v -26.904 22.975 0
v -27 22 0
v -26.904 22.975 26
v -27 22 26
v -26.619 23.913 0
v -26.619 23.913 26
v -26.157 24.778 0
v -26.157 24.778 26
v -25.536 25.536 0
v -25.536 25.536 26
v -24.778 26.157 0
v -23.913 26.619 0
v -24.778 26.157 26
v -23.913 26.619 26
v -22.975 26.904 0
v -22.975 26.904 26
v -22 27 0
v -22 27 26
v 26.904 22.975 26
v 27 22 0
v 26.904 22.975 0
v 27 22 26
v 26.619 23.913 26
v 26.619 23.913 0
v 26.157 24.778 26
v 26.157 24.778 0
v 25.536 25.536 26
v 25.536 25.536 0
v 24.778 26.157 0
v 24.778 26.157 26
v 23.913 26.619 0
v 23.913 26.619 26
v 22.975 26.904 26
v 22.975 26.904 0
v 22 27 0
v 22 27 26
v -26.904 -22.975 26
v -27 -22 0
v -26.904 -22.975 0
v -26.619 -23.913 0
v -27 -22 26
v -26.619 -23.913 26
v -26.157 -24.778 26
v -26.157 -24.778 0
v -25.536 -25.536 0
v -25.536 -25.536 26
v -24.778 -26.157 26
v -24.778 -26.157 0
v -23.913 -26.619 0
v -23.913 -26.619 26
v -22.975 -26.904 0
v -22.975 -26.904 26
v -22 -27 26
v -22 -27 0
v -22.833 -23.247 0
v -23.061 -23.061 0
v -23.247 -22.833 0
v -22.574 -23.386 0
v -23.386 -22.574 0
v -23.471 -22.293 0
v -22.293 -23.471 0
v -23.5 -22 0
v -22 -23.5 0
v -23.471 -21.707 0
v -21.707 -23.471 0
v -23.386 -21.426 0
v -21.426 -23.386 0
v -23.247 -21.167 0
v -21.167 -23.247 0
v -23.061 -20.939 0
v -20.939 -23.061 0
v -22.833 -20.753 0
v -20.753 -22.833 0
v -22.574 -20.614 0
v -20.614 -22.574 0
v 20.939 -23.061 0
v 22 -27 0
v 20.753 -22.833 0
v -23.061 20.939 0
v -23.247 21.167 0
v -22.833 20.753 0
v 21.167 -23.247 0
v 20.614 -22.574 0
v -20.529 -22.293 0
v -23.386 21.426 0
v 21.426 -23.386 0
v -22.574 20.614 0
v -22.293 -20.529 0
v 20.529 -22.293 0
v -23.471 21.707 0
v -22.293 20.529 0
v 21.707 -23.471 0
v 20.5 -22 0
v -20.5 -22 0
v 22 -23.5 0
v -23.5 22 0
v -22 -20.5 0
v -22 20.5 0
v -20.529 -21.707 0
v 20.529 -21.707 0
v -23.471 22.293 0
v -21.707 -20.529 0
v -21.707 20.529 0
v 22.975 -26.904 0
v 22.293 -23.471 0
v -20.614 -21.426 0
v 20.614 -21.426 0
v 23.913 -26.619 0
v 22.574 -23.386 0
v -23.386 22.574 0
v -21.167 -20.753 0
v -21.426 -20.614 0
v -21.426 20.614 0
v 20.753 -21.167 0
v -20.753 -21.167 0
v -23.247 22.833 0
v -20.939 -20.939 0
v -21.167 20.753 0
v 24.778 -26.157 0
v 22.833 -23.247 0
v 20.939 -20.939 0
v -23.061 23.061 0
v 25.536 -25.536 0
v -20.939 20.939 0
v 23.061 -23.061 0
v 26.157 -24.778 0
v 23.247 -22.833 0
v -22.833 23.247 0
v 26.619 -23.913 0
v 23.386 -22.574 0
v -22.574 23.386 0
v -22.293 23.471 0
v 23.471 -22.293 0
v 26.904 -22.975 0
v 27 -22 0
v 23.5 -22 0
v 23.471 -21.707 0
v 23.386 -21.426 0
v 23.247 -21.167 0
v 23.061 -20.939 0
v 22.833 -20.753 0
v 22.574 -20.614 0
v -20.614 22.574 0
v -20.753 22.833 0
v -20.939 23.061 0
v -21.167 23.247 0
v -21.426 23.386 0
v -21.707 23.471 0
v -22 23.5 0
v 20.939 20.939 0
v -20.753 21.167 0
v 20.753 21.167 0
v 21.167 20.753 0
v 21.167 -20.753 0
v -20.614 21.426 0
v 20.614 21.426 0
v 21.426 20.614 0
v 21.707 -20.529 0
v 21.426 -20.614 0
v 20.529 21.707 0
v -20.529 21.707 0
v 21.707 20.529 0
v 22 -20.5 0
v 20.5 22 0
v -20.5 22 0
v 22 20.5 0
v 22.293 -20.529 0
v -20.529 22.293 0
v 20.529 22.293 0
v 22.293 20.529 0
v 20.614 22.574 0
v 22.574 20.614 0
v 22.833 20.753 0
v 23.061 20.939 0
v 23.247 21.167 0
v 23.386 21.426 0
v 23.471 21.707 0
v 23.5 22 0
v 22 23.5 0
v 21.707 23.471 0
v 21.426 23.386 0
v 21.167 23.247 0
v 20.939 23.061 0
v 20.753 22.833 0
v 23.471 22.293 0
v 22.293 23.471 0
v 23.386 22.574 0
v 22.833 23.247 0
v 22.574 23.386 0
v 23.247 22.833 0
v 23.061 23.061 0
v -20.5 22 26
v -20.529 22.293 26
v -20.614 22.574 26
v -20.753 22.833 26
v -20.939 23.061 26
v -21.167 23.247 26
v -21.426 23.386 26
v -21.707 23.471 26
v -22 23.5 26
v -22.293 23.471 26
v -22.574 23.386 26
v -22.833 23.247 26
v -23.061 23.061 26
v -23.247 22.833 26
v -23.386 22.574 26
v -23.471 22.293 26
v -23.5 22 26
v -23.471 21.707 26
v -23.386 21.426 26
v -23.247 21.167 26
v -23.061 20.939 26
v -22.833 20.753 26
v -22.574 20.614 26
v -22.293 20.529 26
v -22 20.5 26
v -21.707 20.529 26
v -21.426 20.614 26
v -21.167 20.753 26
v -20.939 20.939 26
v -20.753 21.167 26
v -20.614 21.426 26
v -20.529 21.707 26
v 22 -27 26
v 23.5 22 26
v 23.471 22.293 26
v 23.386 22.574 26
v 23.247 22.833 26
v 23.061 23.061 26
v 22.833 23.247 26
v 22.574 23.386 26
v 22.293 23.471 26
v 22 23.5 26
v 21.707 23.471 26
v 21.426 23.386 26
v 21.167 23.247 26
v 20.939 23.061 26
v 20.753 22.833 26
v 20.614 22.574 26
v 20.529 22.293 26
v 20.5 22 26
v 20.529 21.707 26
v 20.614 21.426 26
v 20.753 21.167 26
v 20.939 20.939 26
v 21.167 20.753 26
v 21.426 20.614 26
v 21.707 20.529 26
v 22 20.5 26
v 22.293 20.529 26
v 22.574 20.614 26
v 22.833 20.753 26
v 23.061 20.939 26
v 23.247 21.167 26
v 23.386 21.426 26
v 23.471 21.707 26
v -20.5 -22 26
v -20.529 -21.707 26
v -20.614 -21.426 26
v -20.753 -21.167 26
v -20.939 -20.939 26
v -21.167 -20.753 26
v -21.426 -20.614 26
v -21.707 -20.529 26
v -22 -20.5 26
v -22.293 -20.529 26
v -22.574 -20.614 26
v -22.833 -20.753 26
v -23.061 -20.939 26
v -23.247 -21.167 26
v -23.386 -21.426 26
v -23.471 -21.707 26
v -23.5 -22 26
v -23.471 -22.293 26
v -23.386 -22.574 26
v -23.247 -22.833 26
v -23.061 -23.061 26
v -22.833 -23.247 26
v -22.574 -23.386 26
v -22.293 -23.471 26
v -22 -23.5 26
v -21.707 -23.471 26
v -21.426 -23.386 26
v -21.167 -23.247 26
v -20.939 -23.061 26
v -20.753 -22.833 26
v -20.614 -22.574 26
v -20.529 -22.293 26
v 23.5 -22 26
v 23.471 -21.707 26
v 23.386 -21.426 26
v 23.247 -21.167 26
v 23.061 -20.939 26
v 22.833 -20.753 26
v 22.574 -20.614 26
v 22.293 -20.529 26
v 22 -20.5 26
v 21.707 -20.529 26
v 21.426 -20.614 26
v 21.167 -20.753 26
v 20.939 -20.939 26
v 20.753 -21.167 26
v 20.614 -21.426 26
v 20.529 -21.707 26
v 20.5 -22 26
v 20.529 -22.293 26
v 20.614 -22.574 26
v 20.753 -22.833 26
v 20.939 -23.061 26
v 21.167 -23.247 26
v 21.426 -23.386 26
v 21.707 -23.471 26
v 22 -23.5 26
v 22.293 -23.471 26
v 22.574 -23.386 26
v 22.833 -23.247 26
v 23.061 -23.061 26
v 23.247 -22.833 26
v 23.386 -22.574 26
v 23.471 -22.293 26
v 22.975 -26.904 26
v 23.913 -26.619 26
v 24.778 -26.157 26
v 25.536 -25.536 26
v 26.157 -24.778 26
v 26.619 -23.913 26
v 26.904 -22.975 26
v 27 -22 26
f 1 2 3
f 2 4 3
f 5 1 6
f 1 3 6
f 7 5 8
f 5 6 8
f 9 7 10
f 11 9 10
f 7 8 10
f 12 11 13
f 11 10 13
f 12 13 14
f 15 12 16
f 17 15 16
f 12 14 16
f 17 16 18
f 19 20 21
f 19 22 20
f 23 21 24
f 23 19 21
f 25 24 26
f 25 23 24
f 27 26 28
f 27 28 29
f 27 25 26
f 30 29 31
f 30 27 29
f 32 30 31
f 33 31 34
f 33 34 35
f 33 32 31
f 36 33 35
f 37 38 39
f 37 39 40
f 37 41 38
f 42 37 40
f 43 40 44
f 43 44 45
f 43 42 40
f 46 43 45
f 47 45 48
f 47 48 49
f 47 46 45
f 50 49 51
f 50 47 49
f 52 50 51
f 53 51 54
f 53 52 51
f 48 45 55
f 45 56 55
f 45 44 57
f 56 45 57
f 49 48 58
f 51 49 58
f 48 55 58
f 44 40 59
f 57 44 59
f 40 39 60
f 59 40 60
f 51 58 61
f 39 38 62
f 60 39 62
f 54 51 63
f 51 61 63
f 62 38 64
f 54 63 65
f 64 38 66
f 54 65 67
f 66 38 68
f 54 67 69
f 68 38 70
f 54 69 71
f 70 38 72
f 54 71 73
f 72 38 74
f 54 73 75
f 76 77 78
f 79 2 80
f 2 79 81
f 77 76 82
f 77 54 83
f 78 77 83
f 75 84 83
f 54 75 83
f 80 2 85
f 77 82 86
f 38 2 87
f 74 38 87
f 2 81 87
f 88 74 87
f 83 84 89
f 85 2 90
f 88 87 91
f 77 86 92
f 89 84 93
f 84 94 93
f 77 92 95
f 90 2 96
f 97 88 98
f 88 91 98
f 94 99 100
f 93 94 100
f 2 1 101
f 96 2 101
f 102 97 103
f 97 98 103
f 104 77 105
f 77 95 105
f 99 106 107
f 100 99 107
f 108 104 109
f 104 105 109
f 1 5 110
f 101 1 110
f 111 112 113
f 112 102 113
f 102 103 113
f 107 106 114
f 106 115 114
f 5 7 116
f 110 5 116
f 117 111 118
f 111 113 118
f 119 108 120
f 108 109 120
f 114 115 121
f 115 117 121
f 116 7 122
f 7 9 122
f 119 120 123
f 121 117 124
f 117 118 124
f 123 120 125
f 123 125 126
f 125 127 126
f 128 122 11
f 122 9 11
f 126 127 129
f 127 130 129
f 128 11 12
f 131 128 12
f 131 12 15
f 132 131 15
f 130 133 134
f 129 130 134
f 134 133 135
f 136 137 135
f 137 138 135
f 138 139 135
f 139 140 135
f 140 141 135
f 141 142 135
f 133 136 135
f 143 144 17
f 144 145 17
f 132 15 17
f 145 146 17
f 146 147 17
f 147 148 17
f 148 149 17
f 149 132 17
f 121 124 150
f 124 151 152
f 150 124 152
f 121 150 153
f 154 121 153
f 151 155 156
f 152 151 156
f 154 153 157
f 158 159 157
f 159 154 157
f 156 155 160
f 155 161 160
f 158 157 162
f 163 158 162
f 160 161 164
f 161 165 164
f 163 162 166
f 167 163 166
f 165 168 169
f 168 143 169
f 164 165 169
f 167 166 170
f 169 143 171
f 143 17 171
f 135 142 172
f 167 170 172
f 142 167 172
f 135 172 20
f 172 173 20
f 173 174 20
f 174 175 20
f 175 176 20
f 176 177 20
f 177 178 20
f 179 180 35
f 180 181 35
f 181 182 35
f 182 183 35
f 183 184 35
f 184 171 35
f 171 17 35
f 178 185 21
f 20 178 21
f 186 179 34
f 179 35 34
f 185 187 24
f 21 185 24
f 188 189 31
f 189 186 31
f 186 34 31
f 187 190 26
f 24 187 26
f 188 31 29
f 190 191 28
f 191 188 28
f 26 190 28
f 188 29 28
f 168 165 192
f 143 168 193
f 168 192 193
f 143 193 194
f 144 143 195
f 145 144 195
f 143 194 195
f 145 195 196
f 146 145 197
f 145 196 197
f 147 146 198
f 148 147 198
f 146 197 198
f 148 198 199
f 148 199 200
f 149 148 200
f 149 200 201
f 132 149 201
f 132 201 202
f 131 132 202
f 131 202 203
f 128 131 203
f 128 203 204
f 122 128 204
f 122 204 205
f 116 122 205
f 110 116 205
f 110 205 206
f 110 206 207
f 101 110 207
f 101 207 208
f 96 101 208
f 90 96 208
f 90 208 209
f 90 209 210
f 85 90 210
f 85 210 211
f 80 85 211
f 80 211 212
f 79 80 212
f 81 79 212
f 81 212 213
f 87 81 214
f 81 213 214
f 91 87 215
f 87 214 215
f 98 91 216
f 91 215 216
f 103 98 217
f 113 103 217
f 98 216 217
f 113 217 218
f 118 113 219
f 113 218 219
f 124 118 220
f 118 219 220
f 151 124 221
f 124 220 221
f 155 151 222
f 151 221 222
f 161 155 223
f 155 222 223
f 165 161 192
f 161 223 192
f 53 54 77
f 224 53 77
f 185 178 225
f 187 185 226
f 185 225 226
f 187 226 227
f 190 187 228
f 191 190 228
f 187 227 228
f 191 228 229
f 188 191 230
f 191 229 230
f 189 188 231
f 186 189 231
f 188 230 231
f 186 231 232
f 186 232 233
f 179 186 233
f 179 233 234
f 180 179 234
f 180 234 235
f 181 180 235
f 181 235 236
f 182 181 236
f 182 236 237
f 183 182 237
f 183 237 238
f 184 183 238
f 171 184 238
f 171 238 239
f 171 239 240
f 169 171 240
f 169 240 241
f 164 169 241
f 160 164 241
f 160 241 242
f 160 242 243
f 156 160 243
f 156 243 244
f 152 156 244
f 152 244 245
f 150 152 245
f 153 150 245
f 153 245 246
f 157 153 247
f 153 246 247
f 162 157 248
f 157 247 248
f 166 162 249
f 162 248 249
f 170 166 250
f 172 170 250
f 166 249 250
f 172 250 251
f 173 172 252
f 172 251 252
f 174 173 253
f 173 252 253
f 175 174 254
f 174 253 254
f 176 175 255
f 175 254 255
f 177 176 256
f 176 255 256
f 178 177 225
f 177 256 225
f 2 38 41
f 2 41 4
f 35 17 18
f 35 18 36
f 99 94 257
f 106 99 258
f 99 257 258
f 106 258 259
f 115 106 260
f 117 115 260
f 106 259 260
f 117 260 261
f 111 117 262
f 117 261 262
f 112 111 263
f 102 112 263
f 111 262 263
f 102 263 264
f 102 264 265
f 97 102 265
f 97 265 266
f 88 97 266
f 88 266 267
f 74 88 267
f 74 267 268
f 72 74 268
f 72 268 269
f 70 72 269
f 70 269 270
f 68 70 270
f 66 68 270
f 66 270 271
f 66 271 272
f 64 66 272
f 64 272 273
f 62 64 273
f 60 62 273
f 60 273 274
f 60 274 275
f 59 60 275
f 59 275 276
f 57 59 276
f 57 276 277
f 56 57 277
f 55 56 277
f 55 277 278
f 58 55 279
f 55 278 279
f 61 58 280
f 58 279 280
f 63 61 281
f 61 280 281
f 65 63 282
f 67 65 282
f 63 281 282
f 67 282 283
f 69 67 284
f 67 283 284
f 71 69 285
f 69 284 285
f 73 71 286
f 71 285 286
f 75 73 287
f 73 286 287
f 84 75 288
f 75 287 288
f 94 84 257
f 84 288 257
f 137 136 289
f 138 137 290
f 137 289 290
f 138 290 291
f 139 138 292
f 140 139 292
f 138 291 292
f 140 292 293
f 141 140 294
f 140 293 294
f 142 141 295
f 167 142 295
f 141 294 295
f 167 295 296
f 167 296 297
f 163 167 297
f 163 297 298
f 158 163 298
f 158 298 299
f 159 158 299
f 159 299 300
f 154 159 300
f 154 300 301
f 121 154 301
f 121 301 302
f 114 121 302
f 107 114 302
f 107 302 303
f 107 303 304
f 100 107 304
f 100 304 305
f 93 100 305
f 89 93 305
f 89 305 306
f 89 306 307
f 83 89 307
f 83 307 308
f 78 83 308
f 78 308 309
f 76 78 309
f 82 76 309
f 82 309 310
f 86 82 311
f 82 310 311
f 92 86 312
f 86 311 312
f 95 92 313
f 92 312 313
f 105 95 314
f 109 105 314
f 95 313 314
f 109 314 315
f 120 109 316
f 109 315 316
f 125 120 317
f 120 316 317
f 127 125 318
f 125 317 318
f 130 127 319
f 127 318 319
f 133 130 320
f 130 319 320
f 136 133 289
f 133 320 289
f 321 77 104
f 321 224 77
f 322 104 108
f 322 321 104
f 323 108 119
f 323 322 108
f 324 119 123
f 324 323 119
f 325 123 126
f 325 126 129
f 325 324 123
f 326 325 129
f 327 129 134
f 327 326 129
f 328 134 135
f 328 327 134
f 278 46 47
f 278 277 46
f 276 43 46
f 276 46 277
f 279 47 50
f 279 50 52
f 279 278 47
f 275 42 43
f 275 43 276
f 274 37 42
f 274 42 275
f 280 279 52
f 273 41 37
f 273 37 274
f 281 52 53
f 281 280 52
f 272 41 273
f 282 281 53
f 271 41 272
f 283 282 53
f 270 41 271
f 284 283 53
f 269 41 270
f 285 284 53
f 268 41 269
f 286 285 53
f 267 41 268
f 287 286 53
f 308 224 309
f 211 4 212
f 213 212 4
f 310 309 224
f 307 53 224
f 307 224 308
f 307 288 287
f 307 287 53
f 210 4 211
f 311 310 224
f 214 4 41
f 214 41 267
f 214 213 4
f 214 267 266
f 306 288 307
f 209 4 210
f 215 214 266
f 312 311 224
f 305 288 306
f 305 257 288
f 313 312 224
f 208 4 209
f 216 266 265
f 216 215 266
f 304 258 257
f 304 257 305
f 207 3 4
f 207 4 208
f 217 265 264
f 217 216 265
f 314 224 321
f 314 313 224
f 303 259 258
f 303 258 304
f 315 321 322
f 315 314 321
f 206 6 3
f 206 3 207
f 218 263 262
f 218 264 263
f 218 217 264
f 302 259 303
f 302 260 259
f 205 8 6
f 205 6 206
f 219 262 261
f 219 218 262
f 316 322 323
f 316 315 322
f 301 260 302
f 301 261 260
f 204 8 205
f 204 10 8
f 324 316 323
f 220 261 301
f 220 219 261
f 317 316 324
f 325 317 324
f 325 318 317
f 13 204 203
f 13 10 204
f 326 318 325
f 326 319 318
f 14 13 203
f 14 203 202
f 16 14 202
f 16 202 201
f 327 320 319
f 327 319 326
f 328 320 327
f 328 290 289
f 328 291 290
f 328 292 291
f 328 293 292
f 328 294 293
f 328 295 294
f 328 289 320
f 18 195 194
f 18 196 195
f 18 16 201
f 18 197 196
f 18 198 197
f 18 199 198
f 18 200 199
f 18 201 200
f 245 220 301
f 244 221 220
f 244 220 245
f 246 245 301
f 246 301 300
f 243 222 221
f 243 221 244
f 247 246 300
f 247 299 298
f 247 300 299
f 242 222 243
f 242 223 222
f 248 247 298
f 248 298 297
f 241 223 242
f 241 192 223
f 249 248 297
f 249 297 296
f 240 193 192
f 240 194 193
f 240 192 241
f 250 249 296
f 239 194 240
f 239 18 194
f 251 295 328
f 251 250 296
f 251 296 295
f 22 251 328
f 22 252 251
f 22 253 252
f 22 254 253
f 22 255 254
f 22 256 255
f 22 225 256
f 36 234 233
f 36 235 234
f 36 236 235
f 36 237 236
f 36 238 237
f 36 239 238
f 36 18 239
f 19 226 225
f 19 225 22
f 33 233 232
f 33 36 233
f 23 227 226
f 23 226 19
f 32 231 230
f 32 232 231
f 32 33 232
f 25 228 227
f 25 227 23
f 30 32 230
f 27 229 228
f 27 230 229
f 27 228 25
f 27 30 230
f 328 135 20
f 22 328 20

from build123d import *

# Parameters (mm, degrees)
CROQUIS1_W              = 54
CROQUIS1_H              = 54
SALIENTE_EXTRUIR1_DEPTH = 26
REDONDEO1_R             = 5
CROQUIS2_R              = 1.5
CORTAR_EXTRUIR1_DEPTH   = 47.19523785


with BuildPart() as part:
    # Croquis1 → Saliente-Extruir1 (new body)
    with BuildSketch(Plane.XY):
        Rectangle(CROQUIS1_W, CROQUIS1_H)
    extrude(amount=SALIENTE_EXTRUIR1_DEPTH)

    # Redondeo1
    redondeo1_edges = [part.edges().sort_by_distance(p)[0] for p in [
        (-27, 27, 13),
        (27, 27, 13),
        (27, -27, 13),
        (-27, -27, 13),
    ]]
    fillet(redondeo1_edges, radius=REDONDEO1_R)

    # Croquis2 → Cortar-Extruir1 (cut, through all)
    with BuildSketch(Plane.XY.offset(26)):
        with Locations((-22, 22)):
            Circle(CROQUIS2_R)
        with Locations((22, 22)):
            Circle(CROQUIS2_R)
        with Locations((22, -22)):
            Circle(CROQUIS2_R)
        with Locations((-22, -22)):
            Circle(CROQUIS2_R)
    extrude(amount=-CORTAR_EXTRUIR1_DEPTH, mode=Mode.SUBTRACT)


solid = part.part
